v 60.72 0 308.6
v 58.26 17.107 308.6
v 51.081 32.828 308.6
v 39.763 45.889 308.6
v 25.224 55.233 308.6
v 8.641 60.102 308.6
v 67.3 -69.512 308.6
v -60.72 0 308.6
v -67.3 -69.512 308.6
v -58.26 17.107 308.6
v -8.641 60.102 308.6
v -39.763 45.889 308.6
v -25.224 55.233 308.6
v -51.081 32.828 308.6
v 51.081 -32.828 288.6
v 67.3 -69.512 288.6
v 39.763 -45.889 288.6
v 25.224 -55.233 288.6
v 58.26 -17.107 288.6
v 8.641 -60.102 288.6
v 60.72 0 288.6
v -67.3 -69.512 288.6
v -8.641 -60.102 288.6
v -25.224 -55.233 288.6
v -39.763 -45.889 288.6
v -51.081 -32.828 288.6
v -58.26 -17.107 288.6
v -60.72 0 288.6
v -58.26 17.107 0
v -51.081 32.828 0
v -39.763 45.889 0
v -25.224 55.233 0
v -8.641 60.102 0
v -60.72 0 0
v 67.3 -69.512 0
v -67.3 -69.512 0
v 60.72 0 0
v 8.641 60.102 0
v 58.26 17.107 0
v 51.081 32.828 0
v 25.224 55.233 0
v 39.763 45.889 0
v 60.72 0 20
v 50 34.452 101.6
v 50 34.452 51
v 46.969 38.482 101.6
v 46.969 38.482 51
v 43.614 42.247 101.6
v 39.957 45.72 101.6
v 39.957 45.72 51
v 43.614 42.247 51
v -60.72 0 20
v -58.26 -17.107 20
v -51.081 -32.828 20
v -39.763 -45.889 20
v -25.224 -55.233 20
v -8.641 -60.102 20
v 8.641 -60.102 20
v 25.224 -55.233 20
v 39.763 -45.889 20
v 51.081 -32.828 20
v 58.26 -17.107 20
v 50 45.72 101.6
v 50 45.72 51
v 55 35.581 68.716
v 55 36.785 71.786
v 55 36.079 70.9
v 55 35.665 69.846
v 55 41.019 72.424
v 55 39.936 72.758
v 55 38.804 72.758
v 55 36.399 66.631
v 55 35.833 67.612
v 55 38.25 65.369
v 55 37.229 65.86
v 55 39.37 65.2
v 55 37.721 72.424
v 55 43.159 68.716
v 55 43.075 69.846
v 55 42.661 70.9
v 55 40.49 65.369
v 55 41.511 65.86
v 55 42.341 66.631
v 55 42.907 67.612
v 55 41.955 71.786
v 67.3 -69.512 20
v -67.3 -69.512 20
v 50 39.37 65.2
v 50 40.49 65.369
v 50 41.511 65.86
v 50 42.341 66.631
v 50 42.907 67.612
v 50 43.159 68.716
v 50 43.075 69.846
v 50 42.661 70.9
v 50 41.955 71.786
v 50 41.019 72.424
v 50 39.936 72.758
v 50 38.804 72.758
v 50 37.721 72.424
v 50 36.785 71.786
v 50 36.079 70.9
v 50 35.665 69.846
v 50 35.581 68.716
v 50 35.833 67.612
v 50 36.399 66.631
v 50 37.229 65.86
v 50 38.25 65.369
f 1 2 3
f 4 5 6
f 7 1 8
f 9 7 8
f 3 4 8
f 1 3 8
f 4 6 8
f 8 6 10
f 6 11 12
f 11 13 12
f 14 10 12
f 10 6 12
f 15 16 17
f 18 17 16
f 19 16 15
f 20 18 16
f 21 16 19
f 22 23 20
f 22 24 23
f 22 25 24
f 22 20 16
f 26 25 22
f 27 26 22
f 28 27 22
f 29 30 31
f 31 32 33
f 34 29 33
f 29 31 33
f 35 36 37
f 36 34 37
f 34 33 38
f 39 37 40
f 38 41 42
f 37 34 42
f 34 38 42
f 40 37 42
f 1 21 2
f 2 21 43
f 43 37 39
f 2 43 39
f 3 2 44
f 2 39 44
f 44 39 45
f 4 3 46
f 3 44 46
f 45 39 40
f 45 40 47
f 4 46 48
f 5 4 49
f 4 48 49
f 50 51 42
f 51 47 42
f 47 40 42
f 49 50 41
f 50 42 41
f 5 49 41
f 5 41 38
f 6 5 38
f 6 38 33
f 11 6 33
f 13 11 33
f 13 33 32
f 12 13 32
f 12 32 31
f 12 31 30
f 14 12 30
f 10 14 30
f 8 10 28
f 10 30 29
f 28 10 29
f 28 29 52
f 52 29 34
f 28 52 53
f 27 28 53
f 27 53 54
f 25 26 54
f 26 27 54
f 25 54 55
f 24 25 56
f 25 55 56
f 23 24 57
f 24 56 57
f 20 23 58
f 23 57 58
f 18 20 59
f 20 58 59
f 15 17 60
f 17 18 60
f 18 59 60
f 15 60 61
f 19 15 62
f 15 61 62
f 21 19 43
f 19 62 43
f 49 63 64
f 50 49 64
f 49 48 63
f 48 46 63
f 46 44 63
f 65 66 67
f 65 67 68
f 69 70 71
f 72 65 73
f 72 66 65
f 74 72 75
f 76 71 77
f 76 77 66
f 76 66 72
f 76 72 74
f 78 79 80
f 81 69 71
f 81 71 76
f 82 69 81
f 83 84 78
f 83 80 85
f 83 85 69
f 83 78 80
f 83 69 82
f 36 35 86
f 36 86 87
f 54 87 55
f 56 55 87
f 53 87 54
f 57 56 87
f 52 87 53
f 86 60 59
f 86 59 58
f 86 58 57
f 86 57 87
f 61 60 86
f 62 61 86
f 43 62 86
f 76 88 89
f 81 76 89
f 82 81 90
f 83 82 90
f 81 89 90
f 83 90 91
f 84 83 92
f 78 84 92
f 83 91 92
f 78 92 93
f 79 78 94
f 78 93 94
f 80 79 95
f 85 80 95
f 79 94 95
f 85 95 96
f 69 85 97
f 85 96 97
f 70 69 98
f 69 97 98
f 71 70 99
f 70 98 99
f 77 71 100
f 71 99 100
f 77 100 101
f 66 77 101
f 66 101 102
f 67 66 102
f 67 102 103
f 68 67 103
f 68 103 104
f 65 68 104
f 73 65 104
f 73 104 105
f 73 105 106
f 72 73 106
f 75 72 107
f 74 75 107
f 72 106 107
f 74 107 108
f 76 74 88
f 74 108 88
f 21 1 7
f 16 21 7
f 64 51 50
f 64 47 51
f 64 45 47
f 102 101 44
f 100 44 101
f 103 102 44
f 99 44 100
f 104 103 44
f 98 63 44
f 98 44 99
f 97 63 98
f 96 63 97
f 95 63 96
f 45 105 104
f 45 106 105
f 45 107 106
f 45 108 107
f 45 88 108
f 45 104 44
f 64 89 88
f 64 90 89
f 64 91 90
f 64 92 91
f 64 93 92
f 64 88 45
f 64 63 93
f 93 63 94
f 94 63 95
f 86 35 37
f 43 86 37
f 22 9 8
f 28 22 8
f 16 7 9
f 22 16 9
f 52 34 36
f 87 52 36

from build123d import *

# Parameters (mm, degrees)
SKETCH1_R           = 60.72
BOSS_EXTRUDE1_DEPTH = 308.6
BOSS_EXTRUDE2_DEPTH = 20
BOSS_EXTRUDE3_DEPTH = 20
SKETCH4_W           = 50.6
SKETCH4_H           = 12.7
BOSS_EXTRUDE4_DEPTH = 20
SKETCH5_R           = 3.8
BOSS_EXTRUDE5_DEPTH = 5


with BuildPart() as part:
    # Sketch1 → Boss-Extrude1 (new body)
    with BuildSketch(Plane.XY):
        Circle(SKETCH1_R)
    extrude(amount=BOSS_EXTRUDE1_DEPTH)

    # Sketch2 → Boss-Extrude2 (add)
    with BuildSketch(Plane.XY.offset(308.6)):
        Polygon((67.3, -69.512383737), (-67.3, -69.512383737), (-60.72, 0), (60.72, 0), align=None)
    extrude(amount=-BOSS_EXTRUDE2_DEPTH)

    # Sketch3 → Boss-Extrude3 (add)
    with BuildSketch(Plane(origin=(0, 0, 0), x_dir=(-1, 0, 0), z_dir=(0, 0, -1))):
        Polygon((2.236970423, -69.512383737), (-67.3, -69.512383737), (-60.72, 0), (60.72, 0), (67.3, -69.512383737), align=None)
    extrude(amount=-BOSS_EXTRUDE3_DEPTH)

    # Sketch4 → Boss-Extrude4 (add)
    with BuildSketch(Plane(origin=(50, 0, 0), x_dir=(0, 0, -1), z_dir=(1, 0, 0))):
        with Locations((-76.3, 39.37)):
            Rectangle(SKETCH4_W, SKETCH4_H)
    extrude(amount=-BOSS_EXTRUDE4_DEPTH)

    # Sketch5 → Boss-Extrude5 (add)
    with BuildSketch(Plane(origin=(50, 0, 0), x_dir=(0, 0, -1), z_dir=(1, 0, 0))):
        with Locations((-69, 39.37)):
            Circle(SKETCH5_R)
    extrude(amount=BOSS_EXTRUDE5_DEPTH)


solid = part.part
